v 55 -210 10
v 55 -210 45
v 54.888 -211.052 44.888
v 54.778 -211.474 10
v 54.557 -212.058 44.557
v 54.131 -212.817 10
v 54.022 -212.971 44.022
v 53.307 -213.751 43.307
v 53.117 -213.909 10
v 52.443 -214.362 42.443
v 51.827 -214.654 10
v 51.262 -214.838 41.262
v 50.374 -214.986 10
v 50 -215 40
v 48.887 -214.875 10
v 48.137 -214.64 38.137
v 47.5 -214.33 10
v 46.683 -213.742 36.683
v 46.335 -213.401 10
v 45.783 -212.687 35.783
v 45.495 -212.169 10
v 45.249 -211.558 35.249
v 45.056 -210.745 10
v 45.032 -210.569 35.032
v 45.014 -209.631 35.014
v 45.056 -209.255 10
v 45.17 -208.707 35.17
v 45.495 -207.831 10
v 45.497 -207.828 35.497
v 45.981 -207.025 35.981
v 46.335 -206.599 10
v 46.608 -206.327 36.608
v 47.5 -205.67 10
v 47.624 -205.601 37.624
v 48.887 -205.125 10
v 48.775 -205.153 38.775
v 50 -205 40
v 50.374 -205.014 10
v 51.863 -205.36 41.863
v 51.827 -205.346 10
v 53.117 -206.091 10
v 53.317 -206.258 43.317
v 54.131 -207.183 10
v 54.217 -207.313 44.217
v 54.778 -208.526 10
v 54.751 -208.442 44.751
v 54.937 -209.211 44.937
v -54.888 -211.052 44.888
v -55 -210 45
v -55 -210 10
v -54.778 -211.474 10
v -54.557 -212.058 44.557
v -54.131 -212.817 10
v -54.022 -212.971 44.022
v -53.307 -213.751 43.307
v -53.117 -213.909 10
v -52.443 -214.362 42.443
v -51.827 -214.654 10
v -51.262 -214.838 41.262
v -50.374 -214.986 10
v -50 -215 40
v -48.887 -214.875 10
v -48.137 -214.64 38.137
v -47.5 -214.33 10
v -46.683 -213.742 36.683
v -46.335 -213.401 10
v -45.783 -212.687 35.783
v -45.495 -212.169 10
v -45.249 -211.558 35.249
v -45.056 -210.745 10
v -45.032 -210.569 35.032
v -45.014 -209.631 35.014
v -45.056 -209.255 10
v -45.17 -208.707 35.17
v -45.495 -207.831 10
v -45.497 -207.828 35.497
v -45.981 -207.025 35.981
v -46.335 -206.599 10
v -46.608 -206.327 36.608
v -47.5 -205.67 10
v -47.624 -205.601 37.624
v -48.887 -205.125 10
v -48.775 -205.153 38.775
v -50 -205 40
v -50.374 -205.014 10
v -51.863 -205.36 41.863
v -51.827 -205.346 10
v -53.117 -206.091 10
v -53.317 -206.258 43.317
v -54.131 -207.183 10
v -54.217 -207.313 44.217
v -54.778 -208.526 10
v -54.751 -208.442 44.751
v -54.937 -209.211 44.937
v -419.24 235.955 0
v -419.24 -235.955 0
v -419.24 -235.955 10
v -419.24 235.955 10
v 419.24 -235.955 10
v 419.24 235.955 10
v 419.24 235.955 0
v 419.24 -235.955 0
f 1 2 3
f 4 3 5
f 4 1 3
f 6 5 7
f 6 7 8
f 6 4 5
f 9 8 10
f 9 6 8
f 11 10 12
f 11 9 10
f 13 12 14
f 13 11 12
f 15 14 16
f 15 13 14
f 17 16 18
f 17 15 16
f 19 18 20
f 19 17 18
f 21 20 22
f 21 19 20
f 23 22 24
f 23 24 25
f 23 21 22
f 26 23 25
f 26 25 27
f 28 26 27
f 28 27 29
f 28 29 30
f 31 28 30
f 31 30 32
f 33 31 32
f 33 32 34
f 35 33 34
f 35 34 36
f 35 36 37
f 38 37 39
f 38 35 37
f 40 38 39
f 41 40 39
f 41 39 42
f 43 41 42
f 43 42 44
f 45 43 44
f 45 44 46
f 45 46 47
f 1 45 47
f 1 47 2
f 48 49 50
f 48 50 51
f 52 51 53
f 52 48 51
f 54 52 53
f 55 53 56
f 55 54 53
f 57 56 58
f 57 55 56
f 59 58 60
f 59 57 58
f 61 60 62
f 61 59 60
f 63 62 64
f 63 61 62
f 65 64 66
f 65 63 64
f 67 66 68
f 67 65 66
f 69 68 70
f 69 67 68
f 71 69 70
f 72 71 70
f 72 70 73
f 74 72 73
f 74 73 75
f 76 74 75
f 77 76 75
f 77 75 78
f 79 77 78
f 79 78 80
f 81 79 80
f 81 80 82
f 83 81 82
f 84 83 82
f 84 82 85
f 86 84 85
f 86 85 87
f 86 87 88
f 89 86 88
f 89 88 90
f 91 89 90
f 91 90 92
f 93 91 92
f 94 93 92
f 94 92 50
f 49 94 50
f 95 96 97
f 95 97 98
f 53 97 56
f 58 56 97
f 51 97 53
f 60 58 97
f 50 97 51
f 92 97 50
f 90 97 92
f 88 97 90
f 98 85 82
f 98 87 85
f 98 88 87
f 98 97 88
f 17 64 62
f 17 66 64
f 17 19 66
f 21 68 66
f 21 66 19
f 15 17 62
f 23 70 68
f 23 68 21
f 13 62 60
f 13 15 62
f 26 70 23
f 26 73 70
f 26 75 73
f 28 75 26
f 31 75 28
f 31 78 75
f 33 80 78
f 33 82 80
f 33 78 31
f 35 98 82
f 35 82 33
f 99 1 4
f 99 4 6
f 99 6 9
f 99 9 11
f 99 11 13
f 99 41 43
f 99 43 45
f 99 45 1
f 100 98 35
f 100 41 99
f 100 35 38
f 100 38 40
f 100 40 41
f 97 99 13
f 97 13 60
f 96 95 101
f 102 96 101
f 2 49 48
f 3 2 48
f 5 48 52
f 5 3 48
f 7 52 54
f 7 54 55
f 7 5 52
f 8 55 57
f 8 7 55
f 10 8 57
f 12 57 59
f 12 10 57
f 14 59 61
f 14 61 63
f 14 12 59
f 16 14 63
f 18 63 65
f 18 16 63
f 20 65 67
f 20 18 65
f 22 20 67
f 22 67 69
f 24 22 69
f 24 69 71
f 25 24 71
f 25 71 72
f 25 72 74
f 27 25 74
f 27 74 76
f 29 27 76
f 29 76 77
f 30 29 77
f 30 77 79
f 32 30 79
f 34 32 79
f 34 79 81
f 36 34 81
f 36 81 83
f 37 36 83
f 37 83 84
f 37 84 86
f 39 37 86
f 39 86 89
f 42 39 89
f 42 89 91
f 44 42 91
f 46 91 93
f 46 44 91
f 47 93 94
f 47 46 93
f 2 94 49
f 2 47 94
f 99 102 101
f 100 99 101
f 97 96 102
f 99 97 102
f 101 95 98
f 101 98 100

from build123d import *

# Parameters (mm, degrees)
SKETCH1_W           = 838.48
SKETCH1_H           = 471.91
BOSS_EXTRUDE1_DEPTH = 10
SKETCH2_R           = 5


with BuildPart() as part:
    # Sketch1 → Boss-Extrude1 (new body)
    with BuildSketch(Plane.XY):
        Rectangle(SKETCH1_W, SKETCH1_H)
    extrude(amount=BOSS_EXTRUDE1_DEPTH)

    # Sweep3: sweep along a curve in space
    with BuildLine() as sweep3_path:
        Line((-50, -210, 10), (-50, -210, 40))
        Line((50, -210, 40), (-50, -210, 40))
        Line((50, -210, 10), (50, -210, 40))
    # Sketch2 → Sweep3 (sweep)
    with BuildSketch(Plane.XY.offset(10)):
        with Locations((50, -210)):
            Circle(SKETCH2_R)
    sweep(path=sweep3_path.line, transition=Transition.RIGHT)


solid = part.part
